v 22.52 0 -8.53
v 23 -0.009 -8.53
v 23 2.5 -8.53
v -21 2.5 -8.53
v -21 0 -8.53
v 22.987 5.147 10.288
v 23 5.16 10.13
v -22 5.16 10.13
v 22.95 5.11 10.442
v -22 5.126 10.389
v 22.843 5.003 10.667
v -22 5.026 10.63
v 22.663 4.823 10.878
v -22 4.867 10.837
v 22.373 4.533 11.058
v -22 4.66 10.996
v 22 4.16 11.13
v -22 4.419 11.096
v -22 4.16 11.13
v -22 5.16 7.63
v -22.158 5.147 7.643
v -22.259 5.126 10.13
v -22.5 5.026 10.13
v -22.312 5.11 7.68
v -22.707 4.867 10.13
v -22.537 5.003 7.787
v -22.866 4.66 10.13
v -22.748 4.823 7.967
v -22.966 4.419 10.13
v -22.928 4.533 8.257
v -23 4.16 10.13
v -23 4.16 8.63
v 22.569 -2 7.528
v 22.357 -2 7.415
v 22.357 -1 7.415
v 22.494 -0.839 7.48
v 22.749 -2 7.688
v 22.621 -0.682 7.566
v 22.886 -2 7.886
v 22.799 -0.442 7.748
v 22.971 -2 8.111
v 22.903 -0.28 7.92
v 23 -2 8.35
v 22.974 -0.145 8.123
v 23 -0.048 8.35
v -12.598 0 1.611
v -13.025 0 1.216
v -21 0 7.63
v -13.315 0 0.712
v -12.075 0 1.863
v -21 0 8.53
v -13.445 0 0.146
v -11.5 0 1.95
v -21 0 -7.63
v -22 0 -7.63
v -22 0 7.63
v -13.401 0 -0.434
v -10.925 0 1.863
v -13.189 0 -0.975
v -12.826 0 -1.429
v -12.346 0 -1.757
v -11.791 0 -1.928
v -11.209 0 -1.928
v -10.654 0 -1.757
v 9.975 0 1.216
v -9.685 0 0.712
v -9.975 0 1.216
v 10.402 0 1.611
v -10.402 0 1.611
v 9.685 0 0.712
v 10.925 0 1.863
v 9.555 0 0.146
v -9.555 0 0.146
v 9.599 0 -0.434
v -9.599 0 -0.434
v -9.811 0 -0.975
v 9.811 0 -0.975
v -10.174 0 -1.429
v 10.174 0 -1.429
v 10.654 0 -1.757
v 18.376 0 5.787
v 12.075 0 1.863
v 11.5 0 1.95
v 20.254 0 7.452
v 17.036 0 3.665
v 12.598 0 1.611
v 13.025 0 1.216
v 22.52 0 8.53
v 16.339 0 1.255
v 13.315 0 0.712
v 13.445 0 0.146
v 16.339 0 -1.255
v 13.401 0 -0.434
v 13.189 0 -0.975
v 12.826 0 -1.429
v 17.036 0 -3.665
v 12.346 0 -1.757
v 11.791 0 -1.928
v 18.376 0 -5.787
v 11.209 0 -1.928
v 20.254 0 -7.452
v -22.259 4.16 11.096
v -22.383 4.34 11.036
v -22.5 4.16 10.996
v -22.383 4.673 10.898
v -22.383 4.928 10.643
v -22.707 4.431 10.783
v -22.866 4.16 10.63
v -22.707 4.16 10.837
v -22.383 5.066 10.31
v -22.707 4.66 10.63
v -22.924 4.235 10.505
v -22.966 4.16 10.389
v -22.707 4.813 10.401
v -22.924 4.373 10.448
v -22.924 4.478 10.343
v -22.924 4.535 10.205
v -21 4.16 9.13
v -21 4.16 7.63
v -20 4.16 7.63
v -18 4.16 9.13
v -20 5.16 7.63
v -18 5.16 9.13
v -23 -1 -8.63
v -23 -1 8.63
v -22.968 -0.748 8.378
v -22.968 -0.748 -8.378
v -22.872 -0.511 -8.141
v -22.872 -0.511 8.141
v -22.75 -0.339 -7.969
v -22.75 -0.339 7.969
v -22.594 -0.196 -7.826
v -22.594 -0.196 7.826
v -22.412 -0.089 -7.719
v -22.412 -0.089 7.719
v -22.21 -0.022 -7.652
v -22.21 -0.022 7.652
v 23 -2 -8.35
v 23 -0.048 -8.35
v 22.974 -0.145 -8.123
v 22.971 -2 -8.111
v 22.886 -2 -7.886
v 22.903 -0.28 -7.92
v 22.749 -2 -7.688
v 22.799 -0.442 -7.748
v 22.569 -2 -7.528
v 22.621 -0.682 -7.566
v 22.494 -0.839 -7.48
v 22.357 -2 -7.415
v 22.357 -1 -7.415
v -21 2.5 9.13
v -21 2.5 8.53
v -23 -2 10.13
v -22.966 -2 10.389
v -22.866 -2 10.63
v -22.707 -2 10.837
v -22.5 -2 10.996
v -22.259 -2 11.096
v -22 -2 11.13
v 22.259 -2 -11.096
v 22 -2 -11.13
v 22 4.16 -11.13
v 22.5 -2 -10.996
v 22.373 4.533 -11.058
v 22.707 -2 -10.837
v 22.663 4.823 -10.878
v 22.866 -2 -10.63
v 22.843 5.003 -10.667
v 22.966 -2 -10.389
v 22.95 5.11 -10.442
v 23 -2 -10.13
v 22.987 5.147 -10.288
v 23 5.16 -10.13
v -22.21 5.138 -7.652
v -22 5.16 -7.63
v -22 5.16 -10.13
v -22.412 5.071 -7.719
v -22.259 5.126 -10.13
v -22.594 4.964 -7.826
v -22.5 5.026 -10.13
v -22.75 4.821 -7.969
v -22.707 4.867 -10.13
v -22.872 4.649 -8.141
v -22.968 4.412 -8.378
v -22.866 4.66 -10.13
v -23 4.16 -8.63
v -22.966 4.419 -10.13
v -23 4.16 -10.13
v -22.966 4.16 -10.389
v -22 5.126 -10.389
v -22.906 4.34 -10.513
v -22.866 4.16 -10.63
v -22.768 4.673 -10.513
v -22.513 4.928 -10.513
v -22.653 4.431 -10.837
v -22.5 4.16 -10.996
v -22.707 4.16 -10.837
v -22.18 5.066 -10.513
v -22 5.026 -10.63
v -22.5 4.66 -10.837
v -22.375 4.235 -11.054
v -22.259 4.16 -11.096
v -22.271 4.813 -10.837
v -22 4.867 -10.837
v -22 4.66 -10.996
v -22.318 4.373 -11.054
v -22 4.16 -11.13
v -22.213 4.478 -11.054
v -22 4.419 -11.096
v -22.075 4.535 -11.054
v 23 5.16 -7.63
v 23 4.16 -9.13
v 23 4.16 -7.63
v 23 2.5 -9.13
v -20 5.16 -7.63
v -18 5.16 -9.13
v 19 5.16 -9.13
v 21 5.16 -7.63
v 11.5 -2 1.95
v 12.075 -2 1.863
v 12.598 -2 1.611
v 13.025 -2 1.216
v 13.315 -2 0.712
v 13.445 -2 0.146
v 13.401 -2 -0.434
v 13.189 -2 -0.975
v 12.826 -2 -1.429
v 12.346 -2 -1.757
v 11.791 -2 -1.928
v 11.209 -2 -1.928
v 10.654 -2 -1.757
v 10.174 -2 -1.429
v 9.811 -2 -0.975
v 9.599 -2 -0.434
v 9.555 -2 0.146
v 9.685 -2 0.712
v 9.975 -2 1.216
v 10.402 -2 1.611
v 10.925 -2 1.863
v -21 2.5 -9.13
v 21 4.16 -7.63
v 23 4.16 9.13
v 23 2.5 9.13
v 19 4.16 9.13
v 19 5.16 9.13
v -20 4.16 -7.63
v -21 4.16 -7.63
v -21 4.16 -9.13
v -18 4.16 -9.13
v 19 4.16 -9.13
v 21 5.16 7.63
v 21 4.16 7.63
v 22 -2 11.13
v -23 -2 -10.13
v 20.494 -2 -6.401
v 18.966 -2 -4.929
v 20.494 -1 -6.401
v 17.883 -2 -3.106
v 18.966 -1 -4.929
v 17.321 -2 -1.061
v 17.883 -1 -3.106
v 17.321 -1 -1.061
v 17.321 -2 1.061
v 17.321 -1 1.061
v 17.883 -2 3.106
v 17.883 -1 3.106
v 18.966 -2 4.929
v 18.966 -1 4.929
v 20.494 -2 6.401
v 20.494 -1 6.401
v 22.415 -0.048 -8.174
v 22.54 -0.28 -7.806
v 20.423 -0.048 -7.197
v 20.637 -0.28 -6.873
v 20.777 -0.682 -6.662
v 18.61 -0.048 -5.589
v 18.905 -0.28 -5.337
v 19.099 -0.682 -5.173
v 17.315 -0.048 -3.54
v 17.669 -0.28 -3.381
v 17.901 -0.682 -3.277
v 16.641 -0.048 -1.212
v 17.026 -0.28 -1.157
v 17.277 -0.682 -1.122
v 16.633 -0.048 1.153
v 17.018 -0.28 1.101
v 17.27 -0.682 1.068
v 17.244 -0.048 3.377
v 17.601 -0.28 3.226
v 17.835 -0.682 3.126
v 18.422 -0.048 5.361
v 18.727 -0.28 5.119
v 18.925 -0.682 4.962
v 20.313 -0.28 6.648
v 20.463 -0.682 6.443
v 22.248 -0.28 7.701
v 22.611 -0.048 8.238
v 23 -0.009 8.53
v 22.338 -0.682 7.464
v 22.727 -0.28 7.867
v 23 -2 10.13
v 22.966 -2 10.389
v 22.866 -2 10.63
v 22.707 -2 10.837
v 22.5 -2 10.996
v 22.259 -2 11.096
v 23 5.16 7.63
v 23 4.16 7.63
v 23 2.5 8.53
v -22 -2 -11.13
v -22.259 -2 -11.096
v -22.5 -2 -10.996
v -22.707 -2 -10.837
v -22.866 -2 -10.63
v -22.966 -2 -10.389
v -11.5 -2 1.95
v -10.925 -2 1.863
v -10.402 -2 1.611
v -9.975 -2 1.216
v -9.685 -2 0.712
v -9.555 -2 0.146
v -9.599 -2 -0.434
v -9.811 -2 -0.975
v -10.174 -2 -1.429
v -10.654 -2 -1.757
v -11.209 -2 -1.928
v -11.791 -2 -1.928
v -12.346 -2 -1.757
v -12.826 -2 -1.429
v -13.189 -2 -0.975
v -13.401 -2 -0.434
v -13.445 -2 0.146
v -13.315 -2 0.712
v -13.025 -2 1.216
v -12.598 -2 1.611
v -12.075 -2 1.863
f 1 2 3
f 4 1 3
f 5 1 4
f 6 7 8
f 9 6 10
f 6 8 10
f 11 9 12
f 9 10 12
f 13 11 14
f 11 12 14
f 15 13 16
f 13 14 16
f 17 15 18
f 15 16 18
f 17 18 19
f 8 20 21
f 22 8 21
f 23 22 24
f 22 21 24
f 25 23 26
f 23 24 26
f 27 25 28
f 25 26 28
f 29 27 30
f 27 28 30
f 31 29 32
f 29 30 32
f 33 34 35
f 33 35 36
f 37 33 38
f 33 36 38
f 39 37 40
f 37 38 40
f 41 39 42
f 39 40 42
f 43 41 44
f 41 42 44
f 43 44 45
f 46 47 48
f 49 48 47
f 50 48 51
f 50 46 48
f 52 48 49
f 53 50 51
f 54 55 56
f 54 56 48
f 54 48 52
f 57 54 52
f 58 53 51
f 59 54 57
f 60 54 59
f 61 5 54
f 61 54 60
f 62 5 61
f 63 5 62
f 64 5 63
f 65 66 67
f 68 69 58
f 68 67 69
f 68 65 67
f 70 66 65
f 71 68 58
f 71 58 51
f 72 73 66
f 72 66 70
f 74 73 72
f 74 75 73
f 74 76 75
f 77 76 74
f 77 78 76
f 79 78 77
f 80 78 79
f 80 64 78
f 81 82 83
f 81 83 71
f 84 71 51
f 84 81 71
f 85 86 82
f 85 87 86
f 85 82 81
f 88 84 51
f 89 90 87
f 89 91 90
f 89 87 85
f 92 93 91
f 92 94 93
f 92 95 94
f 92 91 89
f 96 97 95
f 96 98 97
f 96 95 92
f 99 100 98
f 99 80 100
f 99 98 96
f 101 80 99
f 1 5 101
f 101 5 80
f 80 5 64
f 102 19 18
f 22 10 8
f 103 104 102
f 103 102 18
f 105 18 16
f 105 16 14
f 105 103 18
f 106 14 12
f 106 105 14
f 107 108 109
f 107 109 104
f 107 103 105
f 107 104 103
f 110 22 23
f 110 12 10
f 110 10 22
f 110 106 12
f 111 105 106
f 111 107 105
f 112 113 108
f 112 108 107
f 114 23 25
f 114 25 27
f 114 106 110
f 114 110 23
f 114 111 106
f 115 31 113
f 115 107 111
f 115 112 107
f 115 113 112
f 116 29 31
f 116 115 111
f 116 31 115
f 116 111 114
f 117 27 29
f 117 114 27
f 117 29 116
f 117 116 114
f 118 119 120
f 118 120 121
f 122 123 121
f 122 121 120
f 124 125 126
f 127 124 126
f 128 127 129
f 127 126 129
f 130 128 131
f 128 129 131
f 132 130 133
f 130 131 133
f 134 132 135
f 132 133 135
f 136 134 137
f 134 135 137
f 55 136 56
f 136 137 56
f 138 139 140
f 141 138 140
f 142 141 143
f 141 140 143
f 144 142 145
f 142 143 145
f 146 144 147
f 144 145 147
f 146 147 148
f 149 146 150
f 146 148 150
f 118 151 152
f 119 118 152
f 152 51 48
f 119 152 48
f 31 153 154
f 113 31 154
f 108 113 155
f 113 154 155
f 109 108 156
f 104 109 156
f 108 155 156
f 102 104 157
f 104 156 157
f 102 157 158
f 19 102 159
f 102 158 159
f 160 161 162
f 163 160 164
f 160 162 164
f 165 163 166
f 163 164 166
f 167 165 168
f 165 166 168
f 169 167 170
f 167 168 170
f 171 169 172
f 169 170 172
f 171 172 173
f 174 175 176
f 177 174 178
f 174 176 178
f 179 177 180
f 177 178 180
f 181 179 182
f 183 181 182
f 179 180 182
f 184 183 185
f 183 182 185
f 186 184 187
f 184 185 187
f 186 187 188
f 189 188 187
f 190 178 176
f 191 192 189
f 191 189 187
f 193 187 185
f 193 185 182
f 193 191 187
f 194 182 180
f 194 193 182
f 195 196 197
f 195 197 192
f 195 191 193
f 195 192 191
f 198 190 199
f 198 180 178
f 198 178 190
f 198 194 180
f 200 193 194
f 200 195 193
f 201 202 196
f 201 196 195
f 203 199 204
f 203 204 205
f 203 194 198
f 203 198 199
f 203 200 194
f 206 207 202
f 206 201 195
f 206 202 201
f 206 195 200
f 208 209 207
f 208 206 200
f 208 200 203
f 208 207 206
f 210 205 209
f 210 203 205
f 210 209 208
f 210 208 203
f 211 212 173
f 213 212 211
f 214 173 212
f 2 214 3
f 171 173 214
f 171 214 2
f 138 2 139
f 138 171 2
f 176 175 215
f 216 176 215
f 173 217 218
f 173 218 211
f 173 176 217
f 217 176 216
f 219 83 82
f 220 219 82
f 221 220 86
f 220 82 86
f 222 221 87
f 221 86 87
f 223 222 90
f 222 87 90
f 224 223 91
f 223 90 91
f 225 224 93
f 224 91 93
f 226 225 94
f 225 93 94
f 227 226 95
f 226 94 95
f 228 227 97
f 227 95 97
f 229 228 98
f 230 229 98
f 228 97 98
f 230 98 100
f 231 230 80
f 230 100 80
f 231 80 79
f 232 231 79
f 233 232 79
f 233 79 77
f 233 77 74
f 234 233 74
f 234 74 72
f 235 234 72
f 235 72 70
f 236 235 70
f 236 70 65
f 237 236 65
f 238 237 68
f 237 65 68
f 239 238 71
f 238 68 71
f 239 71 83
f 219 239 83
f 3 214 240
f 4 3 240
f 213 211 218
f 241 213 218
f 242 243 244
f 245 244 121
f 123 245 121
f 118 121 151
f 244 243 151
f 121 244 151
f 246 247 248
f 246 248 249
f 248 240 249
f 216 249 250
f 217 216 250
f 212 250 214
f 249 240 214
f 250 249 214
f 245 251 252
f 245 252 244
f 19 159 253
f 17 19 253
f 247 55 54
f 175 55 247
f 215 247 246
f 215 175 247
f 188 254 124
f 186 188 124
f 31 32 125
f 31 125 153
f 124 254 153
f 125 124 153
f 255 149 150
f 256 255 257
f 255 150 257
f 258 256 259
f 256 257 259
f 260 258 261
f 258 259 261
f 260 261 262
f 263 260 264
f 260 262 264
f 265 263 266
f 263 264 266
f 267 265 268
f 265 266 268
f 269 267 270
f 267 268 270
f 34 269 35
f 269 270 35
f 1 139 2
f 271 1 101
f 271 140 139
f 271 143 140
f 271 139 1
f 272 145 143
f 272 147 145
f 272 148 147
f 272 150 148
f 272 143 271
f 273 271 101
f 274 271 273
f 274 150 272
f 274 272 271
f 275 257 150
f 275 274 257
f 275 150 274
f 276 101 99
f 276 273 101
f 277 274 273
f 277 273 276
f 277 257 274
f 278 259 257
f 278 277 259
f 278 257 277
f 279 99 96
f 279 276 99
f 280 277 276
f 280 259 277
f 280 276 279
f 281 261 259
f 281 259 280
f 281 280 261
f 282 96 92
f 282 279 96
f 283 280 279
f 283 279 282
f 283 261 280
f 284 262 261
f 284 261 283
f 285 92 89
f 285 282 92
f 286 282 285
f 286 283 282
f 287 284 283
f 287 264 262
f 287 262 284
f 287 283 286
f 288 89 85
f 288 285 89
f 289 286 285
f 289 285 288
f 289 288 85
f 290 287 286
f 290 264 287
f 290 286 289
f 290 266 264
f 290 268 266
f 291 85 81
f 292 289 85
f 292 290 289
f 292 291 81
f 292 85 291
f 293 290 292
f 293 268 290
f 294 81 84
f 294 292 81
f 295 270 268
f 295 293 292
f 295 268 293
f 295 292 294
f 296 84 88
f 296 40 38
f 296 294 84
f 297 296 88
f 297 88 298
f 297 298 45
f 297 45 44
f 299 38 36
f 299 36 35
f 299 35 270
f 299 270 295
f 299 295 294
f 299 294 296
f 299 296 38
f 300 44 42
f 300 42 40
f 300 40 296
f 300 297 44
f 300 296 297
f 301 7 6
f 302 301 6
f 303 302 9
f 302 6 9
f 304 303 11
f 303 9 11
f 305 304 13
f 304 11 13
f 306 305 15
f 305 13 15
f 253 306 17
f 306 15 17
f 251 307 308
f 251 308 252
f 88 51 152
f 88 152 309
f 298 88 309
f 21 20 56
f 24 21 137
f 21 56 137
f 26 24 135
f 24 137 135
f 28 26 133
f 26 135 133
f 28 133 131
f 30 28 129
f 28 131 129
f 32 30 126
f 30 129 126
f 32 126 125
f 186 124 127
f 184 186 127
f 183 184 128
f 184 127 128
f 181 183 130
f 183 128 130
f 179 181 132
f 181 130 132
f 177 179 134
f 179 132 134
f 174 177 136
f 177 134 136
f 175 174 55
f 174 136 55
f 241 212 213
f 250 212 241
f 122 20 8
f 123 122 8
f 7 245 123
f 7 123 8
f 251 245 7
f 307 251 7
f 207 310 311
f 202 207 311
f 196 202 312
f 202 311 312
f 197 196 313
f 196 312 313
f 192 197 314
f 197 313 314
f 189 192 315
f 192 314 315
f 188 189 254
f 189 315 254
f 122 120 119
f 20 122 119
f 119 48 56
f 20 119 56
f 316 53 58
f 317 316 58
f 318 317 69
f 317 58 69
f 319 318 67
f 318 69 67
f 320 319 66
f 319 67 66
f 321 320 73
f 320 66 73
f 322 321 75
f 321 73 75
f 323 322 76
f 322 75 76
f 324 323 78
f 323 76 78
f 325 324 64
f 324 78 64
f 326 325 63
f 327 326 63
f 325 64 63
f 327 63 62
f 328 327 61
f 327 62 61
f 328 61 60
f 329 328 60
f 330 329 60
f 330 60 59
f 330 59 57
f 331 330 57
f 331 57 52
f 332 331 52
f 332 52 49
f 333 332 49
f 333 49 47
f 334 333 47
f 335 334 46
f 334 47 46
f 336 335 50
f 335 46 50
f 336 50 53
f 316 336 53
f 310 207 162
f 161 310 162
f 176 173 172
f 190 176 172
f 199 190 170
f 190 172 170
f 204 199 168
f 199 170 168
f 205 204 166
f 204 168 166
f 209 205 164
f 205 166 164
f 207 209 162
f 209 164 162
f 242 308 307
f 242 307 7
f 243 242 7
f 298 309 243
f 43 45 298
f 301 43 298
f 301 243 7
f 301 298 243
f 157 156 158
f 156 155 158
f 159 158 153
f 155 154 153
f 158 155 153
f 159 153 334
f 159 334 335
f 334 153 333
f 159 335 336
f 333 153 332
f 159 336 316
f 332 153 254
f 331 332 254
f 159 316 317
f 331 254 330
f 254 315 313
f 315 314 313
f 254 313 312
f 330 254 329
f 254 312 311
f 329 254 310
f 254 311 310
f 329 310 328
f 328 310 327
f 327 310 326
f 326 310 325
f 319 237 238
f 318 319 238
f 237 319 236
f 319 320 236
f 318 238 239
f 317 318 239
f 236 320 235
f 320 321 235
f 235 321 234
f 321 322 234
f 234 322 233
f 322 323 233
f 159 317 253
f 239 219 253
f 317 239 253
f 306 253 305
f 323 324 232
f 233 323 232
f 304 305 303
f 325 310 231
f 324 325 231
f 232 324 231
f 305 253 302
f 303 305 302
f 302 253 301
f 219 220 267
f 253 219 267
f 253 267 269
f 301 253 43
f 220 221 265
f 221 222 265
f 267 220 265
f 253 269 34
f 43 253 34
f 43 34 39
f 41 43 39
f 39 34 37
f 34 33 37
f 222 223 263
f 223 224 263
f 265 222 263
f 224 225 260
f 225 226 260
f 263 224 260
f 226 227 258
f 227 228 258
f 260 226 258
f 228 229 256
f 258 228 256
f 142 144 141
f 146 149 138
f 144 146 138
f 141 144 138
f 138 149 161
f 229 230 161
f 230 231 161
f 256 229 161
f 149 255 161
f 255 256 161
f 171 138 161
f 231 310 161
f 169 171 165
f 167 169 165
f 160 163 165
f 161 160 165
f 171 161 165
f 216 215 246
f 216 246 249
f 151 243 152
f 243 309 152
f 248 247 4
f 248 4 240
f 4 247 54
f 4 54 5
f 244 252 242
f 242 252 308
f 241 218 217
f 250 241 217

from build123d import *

# Parameters (mm, degrees)
BASE_W                   = 46
BASE_H                   = 22.26
RESSALTO_EXTRUS_O1_DEPTH = 2
RESSALTO_EXTRUS_O2_DEPTH = 5.16
RESSALTO_EXTRUS_O3_DEPTH = 2.5
RESSALTO_EXTRUS_O4_DEPTH = 1
FUROS_R                  = 1.9500000000000008
FUROS_R_2                = 1.9500000000000002
CORTE_EXTRUS_O1_DEPTH    = 2
CORTE_EXTRUS_O2_DEPTH    = 27.067268748374858
FILETE1_R                = 1


with BuildPart() as part:
    # Base → Ressalto-extrusão1 (new body)
    with BuildSketch(Plane(origin=(0, 0, 0), x_dir=(1, 0, 0), z_dir=(0, 1, 0))):
        Rectangle(BASE_W, BASE_H)
    extrude(amount=-RESSALTO_EXTRUS_O1_DEPTH)

    # Parede_Ext → Ressalto-extrusão2 (add)
    with BuildSketch(Plane(origin=(0, 0, 0), x_dir=(1, 0, 0), z_dir=(0, 1, 0))):
        Polygon((-22.999999999999996, -11.129999999999999), (23.000000000000004, -11.129999999999999), (23.000000000000004, -9.129999999999995), (-20.999999999999993, -9.129999999999999), (-20.999999999999993, -7.63000000000001), (-22.99999999999999, -7.63000000000001), align=None)
        Polygon((-22.999999999999996, 11.130000000000003), (-22.999999999999993, 7.630000000000005), (-20.999999999999996, 7.630000000000005), (-20.999999999999996, 9.130000000000004), (23.000000000000004, 9.13000000000001), (23.000000000000004, 11.130000000000003), align=None)
    extrude(amount=RESSALTO_EXTRUS_O2_DEPTH)

    # Parede_Int → Ressalto-extrusão3 (add)
    with BuildSketch(Plane(origin=(0, 0, 0), x_dir=(1, 0, 0), z_dir=(0, 1, 0))):
        Polygon((23.000000000000004, -9.12999999999999), (-20.999999999999993, -9.129999999999999), (-20.999999999999993, -8.53), (23.000000000000004, -8.52999999999999), align=None)
        Polygon((-20.999999999999996, 9.130000000000004), (23.000000000000004, 9.13000000000001), (23, 8.530000000000008), (-20.999999999999996, 8.530000000000005), align=None)
    extrude(amount=RESSALTO_EXTRUS_O3_DEPTH)

    # Esboço4 → Ressalto-extrusão4 (add)
    with BuildSketch(Plane(origin=(0, 5.16, 0), x_dir=(1, 0, 0), z_dir=(0, 1, 0))):
        Polygon((-20.999999999999996, 7.630000000000005), (-19.999999999999996, 7.630000000000005), (-17.999999999999996, 9.130000000000004), (-20.999999999999996, 9.130000000000004), align=None)
        Polygon((23.000000000000004, 9.13000000000001), (23.000000000000007, 7.630000000000009), (21.000000000000004, 7.630000000000009), (19.000000000000004, 9.13000000000001), align=None)
        Polygon((23.000000000000007, -9.130000000000003), (23.00000000000001, -7.630000000000004), (21.000000000000007, -7.630000000000004), (19.000000000000007, -9.130000000000006), align=None)
        Polygon((-20.999999999999993, -7.63000000000001), (-20.999999999999993, -9.130000000000008), (-17.999999999999993, -9.130000000000008), (-19.999999999999993, -7.63000000000001), align=None)
    extrude(amount=-RESSALTO_EXTRUS_O4_DEPTH)

    # Furos → Corte-extrusão1 (cut)
    with BuildSketch(Plane(origin=(0, 0, 0), x_dir=(1, 0, 0), z_dir=(0, 1, 0))):
        with Locations(Location((11.500000000000002, 0, 0), (0, 0, 270))):
            Circle(FUROS_R)
        with Locations(Location((-11.500000000000002, -7.17e-15, 0), (0, 0, 270))):
            Circle(FUROS_R_2)
    extrude(amount=-CORTE_EXTRUS_O1_DEPTH, mode=Mode.SUBTRACT)

    # Esboço5 → Corte-extrusão2 (cut, through all)
    with BuildSketch(Plane(origin=(0, 0, 0), x_dir=(1, 0, 0), z_dir=(0, 1, 0))):
        with BuildLine():
            ThreePointArc((23, 7.630000000000013), (17.249999999999993, 4.22e-15), (22.999999999999996, -7.630000000000007))
            Line((23.000000000000004, -7.630000000000007), (23, 7.630000000000013))
        make_face()
    extrude(amount=-CORTE_EXTRUS_O2_DEPTH, mode=Mode.SUBTRACT)

    # Filete1
    # the kernel refuses this fillet: 1 mm, written as the material it takes off along each edge
    with BuildSketch(Plane(origin=(-21.999999999999996, 4.16, -10.130000000000003), x_dir=(-1, 0, 0), z_dir=(0, 0, -1))) as filete1_piece_1_section:
        Polygon((0, 0), (FILETE1_R * 1.02, 0), (FILETE1_R * 1.02, FILETE1_R * 1.02), (0, FILETE1_R * 1.02), align=None)
    filete1_piece_1 = extrude(amount=FILETE1_R * 1.02, mode=Mode.PRIVATE)
    filete1_piece_1 = filete1_piece_1 - Plane(origin=(-21.999999999999996, 4.16, -10.130000000000003), x_dir=(0.7071067811865475, -0.7071067811865475, 0), z_dir=(0, 0, -1)) * Sphere(FILETE1_R, mode=Mode.PRIVATE)
    add(filete1_piece_1, mode=Mode.SUBTRACT)
    with BuildSketch(Plane(origin=(-21.999999999999996, 4.16, 10.129999999999999), x_dir=(0, 0, 1), z_dir=(-1, 0, 0))) as filete1_piece_2_section:
        Polygon((0, 0), (FILETE1_R * 1.02, 0), (FILETE1_R * 1.02, FILETE1_R * 1.02), (0, FILETE1_R * 1.02), align=None)
    filete1_piece_2 = extrude(amount=FILETE1_R * 1.02, mode=Mode.PRIVATE)
    filete1_piece_2 = filete1_piece_2 - Plane(origin=(-21.999999999999996, 4.16, 10.129999999999999), x_dir=(0, -0.7071067811865475, -0.7071067811865475), z_dir=(-1, 0, 0)) * Sphere(FILETE1_R, mode=Mode.PRIVATE)
    add(filete1_piece_2, mode=Mode.SUBTRACT)
    with BuildSketch(Plane(origin=(23, 1.7991616598128402, 7.630000000000007), x_dir=(4.94e-15, 0, 1), z_dir=(0, -1, 0))) as filete1_piece_3:
        with BuildLine():
            CenterArc((0.7196646639251312, 1), FILETE1_R, 200.8934853742789, 69.10651462572139)
            ThreePointArc((-0.21458036606277414, 0.6433682235934401), (-0.1004154392092536, 0.32397702119423805), (0, 0))
            Line((0, 0), (0.7196646639251361, 0))
        make_face()
    extrude(amount=5.59832331962568, mode=Mode.SUBTRACT)
    with BuildSketch(Plane(origin=(23, 1.799161659812838, -7.630000000000013), x_dir=(4.94e-15, 0, -1), z_dir=(0, -1, 0))) as filete1_piece_4:
        with BuildLine():
            CenterArc((0.7196646639251303, -1), FILETE1_R, 89.99999999999972, 69.10651462572139)
            ThreePointArc((-0.21458036606277503, -0.6433682235934401), (-0.10041543920925448, -0.3239770211942416), (0, 0))
            Line((0, 0), (0.7196646639251352, 0))
        make_face()
    extrude(amount=5.598323319625676, mode=Mode.SUBTRACT)
    with BuildSketch(Plane(origin=(25.187339130434786, 0, -2.89e-15), x_dir=(0.036112789028829015, 0, -0.9993477205000065), z_dir=(0.9993477205000065, 0, 0.036112789028829015))) as filete1_piece_5_section:
        with BuildLine():
            CenterArc((7.937339130434793 + FILETE1_R, -FILETE1_R), FILETE1_R, 90, 90)
            Line((7.937339130434793, -FILETE1_R), (7.937339130434793, 0))
            Line((7.937339130434793, 0), (7.937339130434793 + FILETE1_R, 0))
        make_face()
    filete1_piece_5 = revolve(axis=Axis((25.187339130434786, 0, -2.89e-15), (0, 1, 0)), revolution_arc=184.13912078928365, mode=Mode.PRIVATE)
    filete1_piece_5 = split(filete1_piece_5, bisect_by=Plane(origin=(25.187339130434786, 0, -8.530000000000008), z_dir=(8e-17, 0, 1)), keep=Keep.TOP, mode=Mode.PRIVATE)
    filete1_piece_5 = split(filete1_piece_5, bisect_by=Plane(origin=(25.187339130434786, 0, 8.52999999999999), z_dir=(-2e-16, 0, -1)), keep=Keep.TOP, mode=Mode.PRIVATE)
    add(filete1_piece_5, mode=Mode.SUBTRACT)
    with BuildSketch(Plane(origin=(-22.99999999999999, 0, 7.63000000000001), x_dir=(-7.11e-15, 0, 1), z_dir=(0, 1, 0))) as filete1_piece_6:
        with BuildLine():
            CenterArc((FILETE1_R, FILETE1_R), FILETE1_R, 180, 90.0000000000004)
            Line((-7.11e-15, FILETE1_R), (0, 0))
            Line((0, 0), (FILETE1_R, 0))
        make_face()
    extrude(amount=7.66, mode=Mode.SUBTRACT)
    with BuildSketch(Plane(origin=(-22.999999999999993, 0, -7.630000000000005), x_dir=(-3.55e-15, 0, -1), z_dir=(0, 1, 0))) as filete1_piece_7:
        with BuildLine():
            CenterArc((FILETE1_R, -FILETE1_R), FILETE1_R, 89.9999999999998, 90.0000000000002)
            Line((-2.66e-15, -FILETE1_R), (0, 0))
            Line((0, 0), (FILETE1_R, 0))
        make_face()
    extrude(amount=7.660000000000002, mode=Mode.SUBTRACT)
    with BuildSketch(Plane(origin=(-22.999999999999996, 0, 7.63000000000001), x_dir=(0, -1, 0), z_dir=(0, 0, -1))) as filete1_piece_8:
        with BuildLine():
            CenterArc((FILETE1_R, -FILETE1_R), FILETE1_R, 90, 90)
            Line((-1.1e-16, -FILETE1_R), (0, 0))
            Line((0, 0), (FILETE1_R, 0))
        make_face()
    extrude(amount=15.260000000000016, mode=Mode.SUBTRACT)
    with BuildSketch(Plane(origin=(-22.999999999999996, 5.16, -10.13), x_dir=(-3.55e-15, -1, 0), z_dir=(1.02e-15, 0, 1))) as filete1_piece_9:
        with BuildLine():
            CenterArc((FILETE1_R, FILETE1_R), FILETE1_R, 180, 90.00000000000023)
            Line((-3.55e-15, FILETE1_R), (0, 0))
            Line((0, 0), (FILETE1_R, 0))
        make_face()
    extrude(amount=4.999999999999996, mode=Mode.SUBTRACT)
    with BuildSketch(Plane(origin=(-22.999999999999996, -4.5, -11.130000000000003), x_dir=(1, 0, 0), z_dir=(0, 1, 0))) as filete1_piece_10:
        with BuildLine():
            CenterArc((FILETE1_R, -FILETE1_R), FILETE1_R, 90, 90)
            Line((0, -FILETE1_R), (0, 0))
            Line((0, 0), (FILETE1_R, 0))
        make_face()
    extrude(amount=8.66, mode=Mode.SUBTRACT)
    with BuildSketch(Plane(origin=(-22.999999999999996, -4.5, 11.129999999999999), x_dir=(0, 0, -1), z_dir=(0, 1, 0))) as filete1_piece_11:
        with BuildLine():
            CenterArc((FILETE1_R, -FILETE1_R), FILETE1_R, 90, 90)
            Line((0, -FILETE1_R), (0, 0))
            Line((0, 0), (FILETE1_R, 0))
        make_face()
    extrude(amount=8.66, mode=Mode.SUBTRACT)
    with BuildSketch(Plane(origin=(-22.999999999999986, 5.16, 5.13000000000001), x_dir=(-3.55e-15, -1, 0), z_dir=(-2.03e-15, 0, 1))) as filete1_piece_12:
        with BuildLine():
            CenterArc((FILETE1_R, FILETE1_R), FILETE1_R, 180, 90.00000000000023)
            Line((-3.55e-15, FILETE1_R), (0, 0))
            Line((0, 0), (FILETE1_R, 0))
        make_face()
    extrude(amount=4.999999999999989, mode=Mode.SUBTRACT)
    with BuildSketch(Plane(origin=(25.500000000000004, 5.16, -11.130000000000003), x_dir=(0, -1, 0), z_dir=(-1, 0, 0)), Plane(origin=(-21.999999999999996, 5.16, 11.129999999999999), x_dir=(0, -1, 0), z_dir=(1, 0, 0))) as filete1_piece_13:
        with BuildLine():
            CenterArc((FILETE1_R, FILETE1_R), FILETE1_R, 180, 90)
            Line((0, FILETE1_R), (0, 0))
            Line((0, 0), (FILETE1_R, 0))
        make_face()
    extrude(amount=47.5, mode=Mode.SUBTRACT)
    with BuildSketch(Plane(origin=(23.000000000000004, 7.66, -11.130000000000003), x_dir=(-1, 0, 0), z_dir=(0, -1, 0))) as filete1_piece_14:
        with BuildLine():
            CenterArc((FILETE1_R, -FILETE1_R), FILETE1_R, 90, 90)
            Line((0, -FILETE1_R), (0, 0))
            Line((0, 0), (FILETE1_R, 0))
        make_face()
    extrude(amount=12.16, mode=Mode.SUBTRACT)
    with BuildSketch(Plane(origin=(23.000000000000004, 7.66, 11.129999999999999), x_dir=(-1, 0, 0), z_dir=(0, -1, 0))) as filete1_piece_15:
        with BuildLine():
            CenterArc((FILETE1_R, FILETE1_R), FILETE1_R, 180, 90)
            Line((0, FILETE1_R), (0, 0))
            Line((0, 0), (FILETE1_R, 0))
        make_face()
    extrude(amount=12.16, mode=Mode.SUBTRACT)
    with BuildSketch(Plane(origin=(-22.999999999999996, 0, 10.13000000000001), x_dir=(0, -1, 0), z_dir=(0, 0, -1))) as filete1_piece_16a_section:
        with BuildLine():
            CenterArc((FILETE1_R, -FILETE1_R), FILETE1_R, 90, 90)
            Line((-1.1e-16, -FILETE1_R), (0, 0))
            Line((0, 0), (FILETE1_R, 0))
        make_face()
    filete1_piece_16a = extrude(amount=17.760000000000016, mode=Mode.PRIVATE)
    filete1_piece_16a = split(filete1_piece_16a, bisect_by=Plane(origin=(-22.999999999999996, 0, 7.63000000000001), z_dir=(0, 0, 1)), keep=Keep.TOP, mode=Mode.PRIVATE)
    with BuildSketch(Plane(origin=(-22.99999999999999, -2.5, 7.63000000000001), x_dir=(-7.11e-15, 0, 1), z_dir=(0, 1, 0))) as filete1_piece_16b_section:
        with BuildLine():
            CenterArc((FILETE1_R, FILETE1_R), FILETE1_R, 180, 90.0000000000004)
            Line((-7.11e-15, FILETE1_R), (0, 0))
            Line((0, 0), (FILETE1_R, 0))
        make_face()
    filete1_piece_16b = extrude(amount=7.66, mode=Mode.PRIVATE)
    filete1_piece_16b = split(filete1_piece_16b, bisect_by=Plane(origin=(-22.99999999999999, -2, 7.63000000000001), z_dir=(0, 1, 0)), keep=Keep.TOP, mode=Mode.PRIVATE)
    filete1_piece_16b = split(filete1_piece_16b, bisect_by=Plane(origin=(-22.99999999999999, 0, 7.63000000000001), z_dir=(0, -1, 0)), keep=Keep.TOP, mode=Mode.PRIVATE)
    filete1_piece_16 = filete1_piece_16a & filete1_piece_16b
    add(filete1_piece_16, mode=Mode.SUBTRACT)
    with BuildSketch(Plane(origin=(-22.999999999999993, -2.5000000000000018, -7.630000000000005), x_dir=(-3.55e-15, 0, -1), z_dir=(0, 1, 0))) as filete1_piece_17a_section:
        with BuildLine():
            CenterArc((FILETE1_R, -FILETE1_R), FILETE1_R, 89.9999999999998, 90.0000000000002)
            Line((-2.66e-15, -FILETE1_R), (0, 0))
            Line((0, 0), (FILETE1_R, 0))
        make_face()
    filete1_piece_17a = extrude(amount=7.660000000000002, mode=Mode.PRIVATE)
    filete1_piece_17a = split(filete1_piece_17a, bisect_by=Plane(origin=(-22.999999999999993, -2, -7.630000000000005), z_dir=(0, 1, 0)), keep=Keep.TOP, mode=Mode.PRIVATE)
    filete1_piece_17a = split(filete1_piece_17a, bisect_by=Plane(origin=(-22.999999999999993, 0, -7.630000000000005), z_dir=(0, -1, 0)), keep=Keep.TOP, mode=Mode.PRIVATE)
    with BuildSketch(Plane(origin=(-22.999999999999996, 0, 7.63000000000001), x_dir=(0, -1, 0), z_dir=(0, 0, -1))) as filete1_piece_17b_section:
        with BuildLine():
            CenterArc((FILETE1_R, -FILETE1_R), FILETE1_R, 90, 90)
            Line((-1.1e-16, -FILETE1_R), (0, 0))
            Line((0, 0), (FILETE1_R, 0))
        make_face()
    filete1_piece_17b = extrude(amount=17.760000000000016, mode=Mode.PRIVATE)
    filete1_piece_17b = split(filete1_piece_17b, bisect_by=Plane(origin=(-22.999999999999996, 0, -7.630000000000006), z_dir=(0, 0, -1)), keep=Keep.TOP, mode=Mode.PRIVATE)
    filete1_piece_17 = filete1_piece_17a & filete1_piece_17b
    add(filete1_piece_17, mode=Mode.SUBTRACT)


solid = part.part
